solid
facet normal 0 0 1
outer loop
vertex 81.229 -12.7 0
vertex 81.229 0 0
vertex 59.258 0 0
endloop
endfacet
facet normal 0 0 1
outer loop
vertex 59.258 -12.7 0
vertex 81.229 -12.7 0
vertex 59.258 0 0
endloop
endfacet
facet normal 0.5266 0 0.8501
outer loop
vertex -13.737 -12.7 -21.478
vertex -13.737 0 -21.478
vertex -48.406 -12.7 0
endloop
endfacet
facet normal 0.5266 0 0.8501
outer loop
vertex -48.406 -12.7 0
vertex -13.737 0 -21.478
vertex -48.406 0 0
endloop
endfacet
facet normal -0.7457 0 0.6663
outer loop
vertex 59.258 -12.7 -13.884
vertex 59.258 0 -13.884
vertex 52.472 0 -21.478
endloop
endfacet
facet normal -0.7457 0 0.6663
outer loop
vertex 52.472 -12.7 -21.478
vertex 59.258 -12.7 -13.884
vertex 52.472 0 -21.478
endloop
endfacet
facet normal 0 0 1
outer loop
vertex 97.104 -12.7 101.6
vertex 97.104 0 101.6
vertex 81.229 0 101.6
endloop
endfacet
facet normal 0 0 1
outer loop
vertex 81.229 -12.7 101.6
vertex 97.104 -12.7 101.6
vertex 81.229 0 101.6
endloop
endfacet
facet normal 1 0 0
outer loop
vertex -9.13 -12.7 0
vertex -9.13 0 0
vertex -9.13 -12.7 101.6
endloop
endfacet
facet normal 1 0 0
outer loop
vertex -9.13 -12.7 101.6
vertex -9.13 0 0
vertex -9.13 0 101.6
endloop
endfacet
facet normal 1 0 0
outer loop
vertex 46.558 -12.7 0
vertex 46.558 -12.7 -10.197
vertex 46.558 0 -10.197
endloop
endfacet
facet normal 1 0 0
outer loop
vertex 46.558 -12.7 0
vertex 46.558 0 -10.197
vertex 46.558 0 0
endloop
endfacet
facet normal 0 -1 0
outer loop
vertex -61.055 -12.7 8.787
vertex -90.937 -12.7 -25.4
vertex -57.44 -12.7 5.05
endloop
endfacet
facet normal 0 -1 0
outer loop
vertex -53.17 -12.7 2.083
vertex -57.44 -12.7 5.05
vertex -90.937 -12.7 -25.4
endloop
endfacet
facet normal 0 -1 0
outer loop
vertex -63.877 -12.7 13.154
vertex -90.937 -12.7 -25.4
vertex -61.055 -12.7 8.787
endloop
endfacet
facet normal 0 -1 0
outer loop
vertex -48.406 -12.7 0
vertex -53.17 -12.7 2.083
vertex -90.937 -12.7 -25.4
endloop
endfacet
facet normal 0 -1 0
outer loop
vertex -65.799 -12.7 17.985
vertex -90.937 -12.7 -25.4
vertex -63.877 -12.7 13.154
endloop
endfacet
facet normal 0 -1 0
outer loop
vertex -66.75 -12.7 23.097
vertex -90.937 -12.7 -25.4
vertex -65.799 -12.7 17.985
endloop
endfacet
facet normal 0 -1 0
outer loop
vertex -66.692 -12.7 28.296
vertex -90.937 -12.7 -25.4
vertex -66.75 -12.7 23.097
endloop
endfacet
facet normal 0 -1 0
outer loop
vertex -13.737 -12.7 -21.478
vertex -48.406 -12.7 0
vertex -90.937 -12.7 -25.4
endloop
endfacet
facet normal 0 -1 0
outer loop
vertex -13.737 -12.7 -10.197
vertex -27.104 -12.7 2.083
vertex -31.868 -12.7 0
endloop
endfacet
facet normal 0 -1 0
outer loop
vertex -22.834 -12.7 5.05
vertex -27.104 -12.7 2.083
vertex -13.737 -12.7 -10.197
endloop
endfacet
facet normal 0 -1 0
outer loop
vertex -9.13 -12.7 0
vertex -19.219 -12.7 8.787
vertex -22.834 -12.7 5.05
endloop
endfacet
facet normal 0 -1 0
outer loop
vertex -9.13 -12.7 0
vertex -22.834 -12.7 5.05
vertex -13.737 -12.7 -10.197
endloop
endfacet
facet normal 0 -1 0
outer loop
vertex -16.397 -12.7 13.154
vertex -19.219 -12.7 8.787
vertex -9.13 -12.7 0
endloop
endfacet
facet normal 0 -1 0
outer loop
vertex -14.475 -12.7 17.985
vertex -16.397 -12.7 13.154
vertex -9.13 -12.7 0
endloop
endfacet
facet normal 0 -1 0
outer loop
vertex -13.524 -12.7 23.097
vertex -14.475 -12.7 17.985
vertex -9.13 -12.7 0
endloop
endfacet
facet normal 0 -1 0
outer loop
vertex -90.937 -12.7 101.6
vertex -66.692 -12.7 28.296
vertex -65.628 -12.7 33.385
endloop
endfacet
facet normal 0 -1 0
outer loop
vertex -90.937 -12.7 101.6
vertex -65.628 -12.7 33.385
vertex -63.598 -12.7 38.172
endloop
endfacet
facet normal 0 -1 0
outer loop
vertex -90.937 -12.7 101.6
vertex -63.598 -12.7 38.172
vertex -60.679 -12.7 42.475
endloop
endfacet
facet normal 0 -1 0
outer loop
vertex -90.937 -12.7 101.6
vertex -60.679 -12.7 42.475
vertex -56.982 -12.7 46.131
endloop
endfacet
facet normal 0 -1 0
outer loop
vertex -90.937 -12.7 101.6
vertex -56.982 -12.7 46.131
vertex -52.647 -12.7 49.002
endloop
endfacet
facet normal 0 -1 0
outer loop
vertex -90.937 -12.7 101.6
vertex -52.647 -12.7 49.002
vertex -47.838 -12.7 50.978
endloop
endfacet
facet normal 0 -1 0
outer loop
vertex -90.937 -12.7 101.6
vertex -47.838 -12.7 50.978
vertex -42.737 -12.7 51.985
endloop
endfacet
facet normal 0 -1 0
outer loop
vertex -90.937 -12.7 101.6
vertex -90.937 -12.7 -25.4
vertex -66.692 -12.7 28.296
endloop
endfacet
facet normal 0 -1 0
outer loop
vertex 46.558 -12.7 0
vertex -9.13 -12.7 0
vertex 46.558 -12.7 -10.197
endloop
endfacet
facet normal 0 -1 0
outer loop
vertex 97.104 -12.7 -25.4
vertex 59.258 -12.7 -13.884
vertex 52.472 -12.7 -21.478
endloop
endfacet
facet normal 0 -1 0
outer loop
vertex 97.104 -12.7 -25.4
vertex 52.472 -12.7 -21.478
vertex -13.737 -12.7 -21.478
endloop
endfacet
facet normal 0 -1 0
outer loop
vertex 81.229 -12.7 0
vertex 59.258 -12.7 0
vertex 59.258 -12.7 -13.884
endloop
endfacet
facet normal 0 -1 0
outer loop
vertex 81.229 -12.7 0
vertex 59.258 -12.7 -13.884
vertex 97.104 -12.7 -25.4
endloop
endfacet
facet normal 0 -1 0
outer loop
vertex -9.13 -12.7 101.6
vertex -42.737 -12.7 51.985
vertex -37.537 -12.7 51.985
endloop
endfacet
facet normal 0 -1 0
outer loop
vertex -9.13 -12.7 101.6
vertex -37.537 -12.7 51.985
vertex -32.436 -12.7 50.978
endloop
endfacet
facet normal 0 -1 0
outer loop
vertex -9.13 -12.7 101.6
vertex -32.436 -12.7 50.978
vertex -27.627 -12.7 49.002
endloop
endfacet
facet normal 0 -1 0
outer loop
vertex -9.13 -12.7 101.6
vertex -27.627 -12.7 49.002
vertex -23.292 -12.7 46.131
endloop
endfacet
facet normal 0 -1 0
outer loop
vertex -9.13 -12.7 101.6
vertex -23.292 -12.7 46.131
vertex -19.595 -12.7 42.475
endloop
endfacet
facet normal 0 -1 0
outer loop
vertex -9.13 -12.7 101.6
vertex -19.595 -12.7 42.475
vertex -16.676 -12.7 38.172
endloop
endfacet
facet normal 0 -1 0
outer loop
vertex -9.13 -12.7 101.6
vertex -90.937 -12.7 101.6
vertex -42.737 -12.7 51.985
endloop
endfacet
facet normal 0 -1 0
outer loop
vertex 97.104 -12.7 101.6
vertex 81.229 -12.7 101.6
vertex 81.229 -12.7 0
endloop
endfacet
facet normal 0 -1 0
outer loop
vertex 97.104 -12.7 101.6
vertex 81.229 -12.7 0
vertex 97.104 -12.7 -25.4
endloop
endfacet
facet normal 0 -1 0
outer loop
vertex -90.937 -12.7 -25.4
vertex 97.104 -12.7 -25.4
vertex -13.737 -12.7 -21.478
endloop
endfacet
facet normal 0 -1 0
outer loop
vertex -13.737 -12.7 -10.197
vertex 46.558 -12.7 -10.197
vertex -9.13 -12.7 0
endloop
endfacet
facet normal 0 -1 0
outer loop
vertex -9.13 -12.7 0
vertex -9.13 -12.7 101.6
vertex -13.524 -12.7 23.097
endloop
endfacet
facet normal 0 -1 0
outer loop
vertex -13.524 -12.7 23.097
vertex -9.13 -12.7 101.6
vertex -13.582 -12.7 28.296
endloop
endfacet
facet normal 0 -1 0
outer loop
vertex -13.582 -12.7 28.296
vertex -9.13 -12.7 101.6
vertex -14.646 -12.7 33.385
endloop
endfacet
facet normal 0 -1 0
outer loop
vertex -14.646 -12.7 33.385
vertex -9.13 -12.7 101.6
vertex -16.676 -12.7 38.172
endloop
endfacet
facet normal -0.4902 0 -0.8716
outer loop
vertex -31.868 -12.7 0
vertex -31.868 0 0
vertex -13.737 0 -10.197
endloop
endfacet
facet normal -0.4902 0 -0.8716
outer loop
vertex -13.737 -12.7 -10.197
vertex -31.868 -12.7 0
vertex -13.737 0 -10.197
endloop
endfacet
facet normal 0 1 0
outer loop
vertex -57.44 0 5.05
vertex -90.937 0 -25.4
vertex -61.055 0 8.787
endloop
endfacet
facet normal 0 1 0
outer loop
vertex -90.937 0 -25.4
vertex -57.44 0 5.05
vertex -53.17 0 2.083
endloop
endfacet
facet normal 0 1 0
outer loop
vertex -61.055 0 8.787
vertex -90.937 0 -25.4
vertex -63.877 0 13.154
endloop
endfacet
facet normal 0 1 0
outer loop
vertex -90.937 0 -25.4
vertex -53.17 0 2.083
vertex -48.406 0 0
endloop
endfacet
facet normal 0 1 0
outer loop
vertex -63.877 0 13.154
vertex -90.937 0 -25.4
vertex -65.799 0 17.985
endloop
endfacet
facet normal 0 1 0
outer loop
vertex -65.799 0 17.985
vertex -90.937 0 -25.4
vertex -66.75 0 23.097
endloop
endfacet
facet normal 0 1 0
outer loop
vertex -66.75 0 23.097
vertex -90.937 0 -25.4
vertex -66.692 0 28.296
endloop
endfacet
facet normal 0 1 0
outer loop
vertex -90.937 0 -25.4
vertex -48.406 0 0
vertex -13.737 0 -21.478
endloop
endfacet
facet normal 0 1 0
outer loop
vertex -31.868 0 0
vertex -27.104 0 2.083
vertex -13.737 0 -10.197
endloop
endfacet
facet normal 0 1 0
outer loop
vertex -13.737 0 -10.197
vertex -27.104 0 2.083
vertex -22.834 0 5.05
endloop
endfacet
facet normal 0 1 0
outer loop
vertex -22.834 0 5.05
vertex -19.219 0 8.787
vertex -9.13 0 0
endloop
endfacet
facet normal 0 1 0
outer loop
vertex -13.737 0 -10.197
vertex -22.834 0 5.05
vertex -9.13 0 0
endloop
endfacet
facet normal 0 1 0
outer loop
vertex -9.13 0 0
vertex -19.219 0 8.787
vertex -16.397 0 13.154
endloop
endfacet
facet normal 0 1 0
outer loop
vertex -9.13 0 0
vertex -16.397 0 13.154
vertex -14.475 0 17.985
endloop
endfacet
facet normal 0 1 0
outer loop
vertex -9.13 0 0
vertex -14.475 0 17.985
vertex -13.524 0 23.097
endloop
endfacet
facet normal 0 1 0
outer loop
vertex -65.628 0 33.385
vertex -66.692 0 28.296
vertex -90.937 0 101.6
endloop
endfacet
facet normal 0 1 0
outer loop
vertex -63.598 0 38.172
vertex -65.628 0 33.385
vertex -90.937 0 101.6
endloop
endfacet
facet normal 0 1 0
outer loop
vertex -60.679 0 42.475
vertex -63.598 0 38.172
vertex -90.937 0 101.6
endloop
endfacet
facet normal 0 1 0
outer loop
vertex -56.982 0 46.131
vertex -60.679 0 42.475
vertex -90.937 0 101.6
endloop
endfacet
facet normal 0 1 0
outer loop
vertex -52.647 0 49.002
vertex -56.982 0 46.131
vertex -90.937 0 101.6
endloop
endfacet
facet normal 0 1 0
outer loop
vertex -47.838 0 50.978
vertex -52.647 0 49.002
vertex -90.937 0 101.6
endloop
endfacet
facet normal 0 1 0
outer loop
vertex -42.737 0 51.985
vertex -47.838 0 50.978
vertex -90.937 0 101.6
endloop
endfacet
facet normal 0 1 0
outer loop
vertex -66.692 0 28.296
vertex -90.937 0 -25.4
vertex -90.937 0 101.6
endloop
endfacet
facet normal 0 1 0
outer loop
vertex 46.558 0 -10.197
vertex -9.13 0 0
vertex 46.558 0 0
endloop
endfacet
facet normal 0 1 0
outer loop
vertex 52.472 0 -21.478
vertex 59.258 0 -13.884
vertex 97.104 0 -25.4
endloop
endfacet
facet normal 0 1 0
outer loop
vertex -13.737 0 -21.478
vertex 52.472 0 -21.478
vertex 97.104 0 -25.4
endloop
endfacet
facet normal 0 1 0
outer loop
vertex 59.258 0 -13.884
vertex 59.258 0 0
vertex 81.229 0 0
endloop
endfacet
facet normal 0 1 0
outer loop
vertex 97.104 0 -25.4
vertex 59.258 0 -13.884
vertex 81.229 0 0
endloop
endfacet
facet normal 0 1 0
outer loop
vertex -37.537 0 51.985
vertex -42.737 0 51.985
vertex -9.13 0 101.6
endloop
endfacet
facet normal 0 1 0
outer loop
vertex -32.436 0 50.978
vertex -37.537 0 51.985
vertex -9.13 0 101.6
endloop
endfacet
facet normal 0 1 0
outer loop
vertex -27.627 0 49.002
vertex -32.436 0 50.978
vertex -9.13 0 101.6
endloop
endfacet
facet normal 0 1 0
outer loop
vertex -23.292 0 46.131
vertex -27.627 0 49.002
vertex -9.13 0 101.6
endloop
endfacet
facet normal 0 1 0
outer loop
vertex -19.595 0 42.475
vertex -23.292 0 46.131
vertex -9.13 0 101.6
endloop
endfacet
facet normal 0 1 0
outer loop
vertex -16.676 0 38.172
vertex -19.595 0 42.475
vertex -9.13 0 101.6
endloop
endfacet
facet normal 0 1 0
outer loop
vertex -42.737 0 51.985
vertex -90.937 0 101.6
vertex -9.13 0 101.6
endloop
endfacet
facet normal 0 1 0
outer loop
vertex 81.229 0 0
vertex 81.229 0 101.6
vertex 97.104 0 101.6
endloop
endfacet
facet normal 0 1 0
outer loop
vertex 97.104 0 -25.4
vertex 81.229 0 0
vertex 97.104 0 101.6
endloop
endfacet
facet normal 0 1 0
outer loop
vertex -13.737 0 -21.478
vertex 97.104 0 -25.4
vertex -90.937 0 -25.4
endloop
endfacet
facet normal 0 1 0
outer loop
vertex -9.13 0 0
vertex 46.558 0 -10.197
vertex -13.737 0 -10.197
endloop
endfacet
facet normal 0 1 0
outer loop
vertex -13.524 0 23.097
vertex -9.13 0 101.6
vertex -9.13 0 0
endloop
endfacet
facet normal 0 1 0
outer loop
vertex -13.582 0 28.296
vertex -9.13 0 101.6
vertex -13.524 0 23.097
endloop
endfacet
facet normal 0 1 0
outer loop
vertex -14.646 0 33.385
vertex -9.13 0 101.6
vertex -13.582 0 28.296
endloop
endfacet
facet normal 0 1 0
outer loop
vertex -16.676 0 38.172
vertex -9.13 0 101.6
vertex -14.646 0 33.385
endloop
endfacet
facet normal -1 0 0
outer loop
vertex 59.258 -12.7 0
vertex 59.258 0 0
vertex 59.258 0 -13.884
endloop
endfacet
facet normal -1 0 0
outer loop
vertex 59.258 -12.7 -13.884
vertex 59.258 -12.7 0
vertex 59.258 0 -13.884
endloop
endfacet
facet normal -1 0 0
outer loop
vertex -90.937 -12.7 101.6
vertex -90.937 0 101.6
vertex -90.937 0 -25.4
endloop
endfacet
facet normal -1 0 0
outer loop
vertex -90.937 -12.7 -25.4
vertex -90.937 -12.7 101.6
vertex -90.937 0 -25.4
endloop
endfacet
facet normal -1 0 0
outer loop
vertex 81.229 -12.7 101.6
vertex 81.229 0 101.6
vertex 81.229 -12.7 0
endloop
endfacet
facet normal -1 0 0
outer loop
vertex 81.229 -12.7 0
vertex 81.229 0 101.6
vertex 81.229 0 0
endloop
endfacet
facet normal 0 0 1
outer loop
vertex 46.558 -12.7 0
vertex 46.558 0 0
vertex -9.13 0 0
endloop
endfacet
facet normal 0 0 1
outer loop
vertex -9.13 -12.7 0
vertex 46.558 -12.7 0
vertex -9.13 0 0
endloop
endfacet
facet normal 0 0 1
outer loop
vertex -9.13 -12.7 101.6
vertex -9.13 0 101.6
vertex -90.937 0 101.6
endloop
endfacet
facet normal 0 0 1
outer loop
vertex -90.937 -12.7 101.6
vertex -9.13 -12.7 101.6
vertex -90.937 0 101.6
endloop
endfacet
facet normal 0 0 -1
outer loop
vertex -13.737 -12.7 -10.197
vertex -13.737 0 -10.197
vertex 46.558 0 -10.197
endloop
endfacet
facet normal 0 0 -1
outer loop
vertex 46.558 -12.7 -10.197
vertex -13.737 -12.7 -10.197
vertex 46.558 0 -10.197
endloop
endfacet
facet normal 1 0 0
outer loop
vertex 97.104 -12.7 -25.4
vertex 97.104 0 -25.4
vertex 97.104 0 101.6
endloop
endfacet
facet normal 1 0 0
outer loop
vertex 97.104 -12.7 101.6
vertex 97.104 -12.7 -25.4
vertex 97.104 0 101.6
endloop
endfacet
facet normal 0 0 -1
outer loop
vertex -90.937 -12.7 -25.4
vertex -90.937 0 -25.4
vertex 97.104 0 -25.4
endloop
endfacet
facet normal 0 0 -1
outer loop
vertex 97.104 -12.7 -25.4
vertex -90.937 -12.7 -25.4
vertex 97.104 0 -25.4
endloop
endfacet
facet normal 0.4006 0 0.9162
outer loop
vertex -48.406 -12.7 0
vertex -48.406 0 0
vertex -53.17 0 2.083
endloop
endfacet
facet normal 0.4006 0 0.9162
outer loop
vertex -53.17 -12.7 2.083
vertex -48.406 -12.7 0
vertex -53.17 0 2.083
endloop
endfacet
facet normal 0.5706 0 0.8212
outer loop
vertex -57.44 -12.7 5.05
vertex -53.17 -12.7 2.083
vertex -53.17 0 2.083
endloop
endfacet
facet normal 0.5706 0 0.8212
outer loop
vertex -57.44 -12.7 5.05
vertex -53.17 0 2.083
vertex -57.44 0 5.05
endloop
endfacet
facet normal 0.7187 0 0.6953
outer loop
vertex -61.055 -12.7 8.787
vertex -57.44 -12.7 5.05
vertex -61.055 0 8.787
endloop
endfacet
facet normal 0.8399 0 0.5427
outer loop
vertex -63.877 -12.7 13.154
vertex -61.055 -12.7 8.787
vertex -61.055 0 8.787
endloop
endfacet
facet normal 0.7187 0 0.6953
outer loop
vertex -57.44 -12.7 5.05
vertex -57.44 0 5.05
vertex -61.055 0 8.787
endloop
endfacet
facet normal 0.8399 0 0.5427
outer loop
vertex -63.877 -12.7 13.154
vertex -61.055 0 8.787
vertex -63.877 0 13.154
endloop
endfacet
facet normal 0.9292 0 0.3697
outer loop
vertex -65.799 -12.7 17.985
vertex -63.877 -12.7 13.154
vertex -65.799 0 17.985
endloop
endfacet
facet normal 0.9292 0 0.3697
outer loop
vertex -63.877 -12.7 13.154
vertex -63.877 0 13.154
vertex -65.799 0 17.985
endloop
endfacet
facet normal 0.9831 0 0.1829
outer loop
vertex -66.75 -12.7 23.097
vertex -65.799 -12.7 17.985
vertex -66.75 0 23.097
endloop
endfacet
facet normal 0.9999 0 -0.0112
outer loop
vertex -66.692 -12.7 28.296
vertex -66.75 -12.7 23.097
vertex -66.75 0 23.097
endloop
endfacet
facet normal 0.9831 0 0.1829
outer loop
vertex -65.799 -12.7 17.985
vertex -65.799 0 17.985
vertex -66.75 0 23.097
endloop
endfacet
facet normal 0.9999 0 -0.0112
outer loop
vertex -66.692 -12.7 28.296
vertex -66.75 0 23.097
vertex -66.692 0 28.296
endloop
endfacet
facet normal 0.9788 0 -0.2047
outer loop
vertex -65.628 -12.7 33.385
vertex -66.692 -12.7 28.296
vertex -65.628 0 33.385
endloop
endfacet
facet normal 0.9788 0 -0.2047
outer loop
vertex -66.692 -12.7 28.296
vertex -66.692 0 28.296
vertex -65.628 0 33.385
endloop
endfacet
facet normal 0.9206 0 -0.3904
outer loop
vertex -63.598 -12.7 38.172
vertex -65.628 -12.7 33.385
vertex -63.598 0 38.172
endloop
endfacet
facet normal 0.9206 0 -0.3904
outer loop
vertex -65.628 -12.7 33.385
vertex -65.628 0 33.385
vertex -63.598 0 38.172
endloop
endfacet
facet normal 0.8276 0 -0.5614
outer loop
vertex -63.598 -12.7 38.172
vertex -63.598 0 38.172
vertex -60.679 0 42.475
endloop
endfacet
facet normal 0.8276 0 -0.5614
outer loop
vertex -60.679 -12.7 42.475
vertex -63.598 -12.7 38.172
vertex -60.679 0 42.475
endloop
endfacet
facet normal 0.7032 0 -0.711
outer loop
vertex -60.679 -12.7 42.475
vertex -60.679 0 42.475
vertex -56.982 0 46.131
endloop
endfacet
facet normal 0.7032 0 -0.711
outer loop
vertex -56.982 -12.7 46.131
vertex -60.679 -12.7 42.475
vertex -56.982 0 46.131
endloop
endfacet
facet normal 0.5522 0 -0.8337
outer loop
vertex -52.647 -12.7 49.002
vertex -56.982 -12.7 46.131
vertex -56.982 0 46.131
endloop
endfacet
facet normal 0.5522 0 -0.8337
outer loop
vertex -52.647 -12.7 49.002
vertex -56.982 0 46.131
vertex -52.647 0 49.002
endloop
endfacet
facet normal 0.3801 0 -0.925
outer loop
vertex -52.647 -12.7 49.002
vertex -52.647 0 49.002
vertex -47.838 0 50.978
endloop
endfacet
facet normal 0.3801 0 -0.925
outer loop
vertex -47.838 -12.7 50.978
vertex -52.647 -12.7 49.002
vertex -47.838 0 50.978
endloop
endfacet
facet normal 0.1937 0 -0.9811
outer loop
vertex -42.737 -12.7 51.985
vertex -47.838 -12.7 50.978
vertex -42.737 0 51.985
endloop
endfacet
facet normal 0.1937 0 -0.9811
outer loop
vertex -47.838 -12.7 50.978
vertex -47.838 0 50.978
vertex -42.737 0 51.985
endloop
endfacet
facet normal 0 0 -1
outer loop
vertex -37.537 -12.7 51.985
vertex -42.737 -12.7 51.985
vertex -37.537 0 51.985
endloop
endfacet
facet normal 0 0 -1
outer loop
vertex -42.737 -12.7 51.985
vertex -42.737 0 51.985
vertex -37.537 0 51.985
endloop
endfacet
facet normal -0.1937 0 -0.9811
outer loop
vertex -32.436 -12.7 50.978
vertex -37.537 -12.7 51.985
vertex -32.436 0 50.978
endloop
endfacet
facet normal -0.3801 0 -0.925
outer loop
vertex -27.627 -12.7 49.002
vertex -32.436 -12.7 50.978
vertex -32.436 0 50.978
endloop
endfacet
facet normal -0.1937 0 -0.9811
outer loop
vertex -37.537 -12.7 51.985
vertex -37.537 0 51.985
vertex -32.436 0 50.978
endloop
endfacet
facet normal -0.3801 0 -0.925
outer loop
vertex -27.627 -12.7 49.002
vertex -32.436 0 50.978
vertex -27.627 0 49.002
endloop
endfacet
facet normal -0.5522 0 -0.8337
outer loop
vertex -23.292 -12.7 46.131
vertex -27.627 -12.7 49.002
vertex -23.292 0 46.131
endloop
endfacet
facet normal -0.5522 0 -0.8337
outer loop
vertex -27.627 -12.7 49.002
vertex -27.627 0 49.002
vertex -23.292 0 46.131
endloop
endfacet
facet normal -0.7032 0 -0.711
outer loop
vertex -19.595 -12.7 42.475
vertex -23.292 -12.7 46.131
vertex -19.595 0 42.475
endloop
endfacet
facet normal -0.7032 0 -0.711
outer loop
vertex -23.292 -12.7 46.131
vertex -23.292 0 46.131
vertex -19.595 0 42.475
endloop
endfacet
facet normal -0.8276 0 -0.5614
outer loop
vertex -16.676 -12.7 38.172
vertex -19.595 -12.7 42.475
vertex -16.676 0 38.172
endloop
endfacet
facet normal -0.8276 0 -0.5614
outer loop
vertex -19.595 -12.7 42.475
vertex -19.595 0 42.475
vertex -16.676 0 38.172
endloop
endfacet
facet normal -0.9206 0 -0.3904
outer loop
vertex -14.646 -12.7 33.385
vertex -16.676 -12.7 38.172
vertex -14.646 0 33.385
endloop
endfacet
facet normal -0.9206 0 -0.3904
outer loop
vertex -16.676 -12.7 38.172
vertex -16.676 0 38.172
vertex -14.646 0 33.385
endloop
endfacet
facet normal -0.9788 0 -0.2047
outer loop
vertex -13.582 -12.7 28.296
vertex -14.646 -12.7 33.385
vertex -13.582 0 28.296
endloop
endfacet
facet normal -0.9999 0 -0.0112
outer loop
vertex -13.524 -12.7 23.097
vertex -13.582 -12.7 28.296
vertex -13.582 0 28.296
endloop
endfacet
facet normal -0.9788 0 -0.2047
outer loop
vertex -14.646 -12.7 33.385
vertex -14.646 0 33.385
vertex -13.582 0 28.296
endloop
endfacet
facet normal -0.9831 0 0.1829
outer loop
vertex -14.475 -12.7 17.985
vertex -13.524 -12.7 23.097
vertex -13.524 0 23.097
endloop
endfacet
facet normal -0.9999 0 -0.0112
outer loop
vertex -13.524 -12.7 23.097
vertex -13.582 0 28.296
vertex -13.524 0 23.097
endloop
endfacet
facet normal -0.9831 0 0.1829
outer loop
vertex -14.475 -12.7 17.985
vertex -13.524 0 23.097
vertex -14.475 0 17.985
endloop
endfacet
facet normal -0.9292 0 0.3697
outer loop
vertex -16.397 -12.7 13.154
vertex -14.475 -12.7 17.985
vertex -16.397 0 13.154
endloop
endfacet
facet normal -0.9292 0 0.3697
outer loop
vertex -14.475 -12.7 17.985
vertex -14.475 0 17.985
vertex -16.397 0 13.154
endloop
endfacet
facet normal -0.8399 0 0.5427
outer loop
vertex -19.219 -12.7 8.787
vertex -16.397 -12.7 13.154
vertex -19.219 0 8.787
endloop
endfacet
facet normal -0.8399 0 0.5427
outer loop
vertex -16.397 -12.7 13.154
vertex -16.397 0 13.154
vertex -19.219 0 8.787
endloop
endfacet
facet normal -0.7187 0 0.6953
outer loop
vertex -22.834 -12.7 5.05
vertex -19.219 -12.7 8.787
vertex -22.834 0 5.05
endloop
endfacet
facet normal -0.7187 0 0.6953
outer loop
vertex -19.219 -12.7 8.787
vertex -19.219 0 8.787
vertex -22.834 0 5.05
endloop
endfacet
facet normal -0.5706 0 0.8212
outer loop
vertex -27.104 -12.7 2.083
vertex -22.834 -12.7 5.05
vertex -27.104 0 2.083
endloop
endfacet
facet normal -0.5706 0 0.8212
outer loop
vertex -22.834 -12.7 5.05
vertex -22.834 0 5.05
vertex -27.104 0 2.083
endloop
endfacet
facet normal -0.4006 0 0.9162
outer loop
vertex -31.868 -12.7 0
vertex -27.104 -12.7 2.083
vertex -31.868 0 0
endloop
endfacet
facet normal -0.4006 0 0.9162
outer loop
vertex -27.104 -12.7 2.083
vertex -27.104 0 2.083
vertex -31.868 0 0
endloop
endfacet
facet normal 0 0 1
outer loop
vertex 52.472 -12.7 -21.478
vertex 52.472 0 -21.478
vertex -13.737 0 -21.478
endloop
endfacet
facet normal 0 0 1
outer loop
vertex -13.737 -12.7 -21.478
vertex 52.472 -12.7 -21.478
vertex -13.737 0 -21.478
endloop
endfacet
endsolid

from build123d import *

# Parameters (mm, degrees)
F1_DEPTH = 12.7


with BuildPart() as f1:
    # F0 (on Front) → F1 (new body)
    with BuildSketch(Plane.XZ):
        with BuildLine():
            Line((-9.130059, 101.6), (-90.936985, 101.6))
            Line((-90.936985, 101.6), (-90.936985, -25.4))
            Line((-90.936985, -25.4), (97.104346, -25.4))
            Line((97.104346, -25.4), (97.104346, 101.6))
            Line((97.104346, 101.6), (81.229346, 101.6))
            Line((81.229346, 101.6), (81.229346, 0))
            Line((81.229346, 0), (59.258346, 0))
            Line((59.258346, 0), (59.258346, -13.884136))
            Line((59.258346, -13.884136), (52.471939, -21.478448))
            Line((52.471939, -21.478448), (-13.737017, -21.478448))
            Line((-13.737017, -21.478448), (-48.406098, 0))
            ThreePointArc((-48.406098, 0), (-40.136985, 52.112136), (-31.867873, 0))
            Line((-31.867873, 0), (-13.737017, -10.196643))
            Line((-13.737017, -10.196643), (46.558346, -10.196643))
            Line((46.558346, -10.196643), (46.558346, 0))
            Line((46.558346, 0), (-9.130059, 0))
            Line((-9.130059, 0), (-9.130059, 101.6))
        make_face()
    extrude(amount=F1_DEPTH)


solid = f1.part
